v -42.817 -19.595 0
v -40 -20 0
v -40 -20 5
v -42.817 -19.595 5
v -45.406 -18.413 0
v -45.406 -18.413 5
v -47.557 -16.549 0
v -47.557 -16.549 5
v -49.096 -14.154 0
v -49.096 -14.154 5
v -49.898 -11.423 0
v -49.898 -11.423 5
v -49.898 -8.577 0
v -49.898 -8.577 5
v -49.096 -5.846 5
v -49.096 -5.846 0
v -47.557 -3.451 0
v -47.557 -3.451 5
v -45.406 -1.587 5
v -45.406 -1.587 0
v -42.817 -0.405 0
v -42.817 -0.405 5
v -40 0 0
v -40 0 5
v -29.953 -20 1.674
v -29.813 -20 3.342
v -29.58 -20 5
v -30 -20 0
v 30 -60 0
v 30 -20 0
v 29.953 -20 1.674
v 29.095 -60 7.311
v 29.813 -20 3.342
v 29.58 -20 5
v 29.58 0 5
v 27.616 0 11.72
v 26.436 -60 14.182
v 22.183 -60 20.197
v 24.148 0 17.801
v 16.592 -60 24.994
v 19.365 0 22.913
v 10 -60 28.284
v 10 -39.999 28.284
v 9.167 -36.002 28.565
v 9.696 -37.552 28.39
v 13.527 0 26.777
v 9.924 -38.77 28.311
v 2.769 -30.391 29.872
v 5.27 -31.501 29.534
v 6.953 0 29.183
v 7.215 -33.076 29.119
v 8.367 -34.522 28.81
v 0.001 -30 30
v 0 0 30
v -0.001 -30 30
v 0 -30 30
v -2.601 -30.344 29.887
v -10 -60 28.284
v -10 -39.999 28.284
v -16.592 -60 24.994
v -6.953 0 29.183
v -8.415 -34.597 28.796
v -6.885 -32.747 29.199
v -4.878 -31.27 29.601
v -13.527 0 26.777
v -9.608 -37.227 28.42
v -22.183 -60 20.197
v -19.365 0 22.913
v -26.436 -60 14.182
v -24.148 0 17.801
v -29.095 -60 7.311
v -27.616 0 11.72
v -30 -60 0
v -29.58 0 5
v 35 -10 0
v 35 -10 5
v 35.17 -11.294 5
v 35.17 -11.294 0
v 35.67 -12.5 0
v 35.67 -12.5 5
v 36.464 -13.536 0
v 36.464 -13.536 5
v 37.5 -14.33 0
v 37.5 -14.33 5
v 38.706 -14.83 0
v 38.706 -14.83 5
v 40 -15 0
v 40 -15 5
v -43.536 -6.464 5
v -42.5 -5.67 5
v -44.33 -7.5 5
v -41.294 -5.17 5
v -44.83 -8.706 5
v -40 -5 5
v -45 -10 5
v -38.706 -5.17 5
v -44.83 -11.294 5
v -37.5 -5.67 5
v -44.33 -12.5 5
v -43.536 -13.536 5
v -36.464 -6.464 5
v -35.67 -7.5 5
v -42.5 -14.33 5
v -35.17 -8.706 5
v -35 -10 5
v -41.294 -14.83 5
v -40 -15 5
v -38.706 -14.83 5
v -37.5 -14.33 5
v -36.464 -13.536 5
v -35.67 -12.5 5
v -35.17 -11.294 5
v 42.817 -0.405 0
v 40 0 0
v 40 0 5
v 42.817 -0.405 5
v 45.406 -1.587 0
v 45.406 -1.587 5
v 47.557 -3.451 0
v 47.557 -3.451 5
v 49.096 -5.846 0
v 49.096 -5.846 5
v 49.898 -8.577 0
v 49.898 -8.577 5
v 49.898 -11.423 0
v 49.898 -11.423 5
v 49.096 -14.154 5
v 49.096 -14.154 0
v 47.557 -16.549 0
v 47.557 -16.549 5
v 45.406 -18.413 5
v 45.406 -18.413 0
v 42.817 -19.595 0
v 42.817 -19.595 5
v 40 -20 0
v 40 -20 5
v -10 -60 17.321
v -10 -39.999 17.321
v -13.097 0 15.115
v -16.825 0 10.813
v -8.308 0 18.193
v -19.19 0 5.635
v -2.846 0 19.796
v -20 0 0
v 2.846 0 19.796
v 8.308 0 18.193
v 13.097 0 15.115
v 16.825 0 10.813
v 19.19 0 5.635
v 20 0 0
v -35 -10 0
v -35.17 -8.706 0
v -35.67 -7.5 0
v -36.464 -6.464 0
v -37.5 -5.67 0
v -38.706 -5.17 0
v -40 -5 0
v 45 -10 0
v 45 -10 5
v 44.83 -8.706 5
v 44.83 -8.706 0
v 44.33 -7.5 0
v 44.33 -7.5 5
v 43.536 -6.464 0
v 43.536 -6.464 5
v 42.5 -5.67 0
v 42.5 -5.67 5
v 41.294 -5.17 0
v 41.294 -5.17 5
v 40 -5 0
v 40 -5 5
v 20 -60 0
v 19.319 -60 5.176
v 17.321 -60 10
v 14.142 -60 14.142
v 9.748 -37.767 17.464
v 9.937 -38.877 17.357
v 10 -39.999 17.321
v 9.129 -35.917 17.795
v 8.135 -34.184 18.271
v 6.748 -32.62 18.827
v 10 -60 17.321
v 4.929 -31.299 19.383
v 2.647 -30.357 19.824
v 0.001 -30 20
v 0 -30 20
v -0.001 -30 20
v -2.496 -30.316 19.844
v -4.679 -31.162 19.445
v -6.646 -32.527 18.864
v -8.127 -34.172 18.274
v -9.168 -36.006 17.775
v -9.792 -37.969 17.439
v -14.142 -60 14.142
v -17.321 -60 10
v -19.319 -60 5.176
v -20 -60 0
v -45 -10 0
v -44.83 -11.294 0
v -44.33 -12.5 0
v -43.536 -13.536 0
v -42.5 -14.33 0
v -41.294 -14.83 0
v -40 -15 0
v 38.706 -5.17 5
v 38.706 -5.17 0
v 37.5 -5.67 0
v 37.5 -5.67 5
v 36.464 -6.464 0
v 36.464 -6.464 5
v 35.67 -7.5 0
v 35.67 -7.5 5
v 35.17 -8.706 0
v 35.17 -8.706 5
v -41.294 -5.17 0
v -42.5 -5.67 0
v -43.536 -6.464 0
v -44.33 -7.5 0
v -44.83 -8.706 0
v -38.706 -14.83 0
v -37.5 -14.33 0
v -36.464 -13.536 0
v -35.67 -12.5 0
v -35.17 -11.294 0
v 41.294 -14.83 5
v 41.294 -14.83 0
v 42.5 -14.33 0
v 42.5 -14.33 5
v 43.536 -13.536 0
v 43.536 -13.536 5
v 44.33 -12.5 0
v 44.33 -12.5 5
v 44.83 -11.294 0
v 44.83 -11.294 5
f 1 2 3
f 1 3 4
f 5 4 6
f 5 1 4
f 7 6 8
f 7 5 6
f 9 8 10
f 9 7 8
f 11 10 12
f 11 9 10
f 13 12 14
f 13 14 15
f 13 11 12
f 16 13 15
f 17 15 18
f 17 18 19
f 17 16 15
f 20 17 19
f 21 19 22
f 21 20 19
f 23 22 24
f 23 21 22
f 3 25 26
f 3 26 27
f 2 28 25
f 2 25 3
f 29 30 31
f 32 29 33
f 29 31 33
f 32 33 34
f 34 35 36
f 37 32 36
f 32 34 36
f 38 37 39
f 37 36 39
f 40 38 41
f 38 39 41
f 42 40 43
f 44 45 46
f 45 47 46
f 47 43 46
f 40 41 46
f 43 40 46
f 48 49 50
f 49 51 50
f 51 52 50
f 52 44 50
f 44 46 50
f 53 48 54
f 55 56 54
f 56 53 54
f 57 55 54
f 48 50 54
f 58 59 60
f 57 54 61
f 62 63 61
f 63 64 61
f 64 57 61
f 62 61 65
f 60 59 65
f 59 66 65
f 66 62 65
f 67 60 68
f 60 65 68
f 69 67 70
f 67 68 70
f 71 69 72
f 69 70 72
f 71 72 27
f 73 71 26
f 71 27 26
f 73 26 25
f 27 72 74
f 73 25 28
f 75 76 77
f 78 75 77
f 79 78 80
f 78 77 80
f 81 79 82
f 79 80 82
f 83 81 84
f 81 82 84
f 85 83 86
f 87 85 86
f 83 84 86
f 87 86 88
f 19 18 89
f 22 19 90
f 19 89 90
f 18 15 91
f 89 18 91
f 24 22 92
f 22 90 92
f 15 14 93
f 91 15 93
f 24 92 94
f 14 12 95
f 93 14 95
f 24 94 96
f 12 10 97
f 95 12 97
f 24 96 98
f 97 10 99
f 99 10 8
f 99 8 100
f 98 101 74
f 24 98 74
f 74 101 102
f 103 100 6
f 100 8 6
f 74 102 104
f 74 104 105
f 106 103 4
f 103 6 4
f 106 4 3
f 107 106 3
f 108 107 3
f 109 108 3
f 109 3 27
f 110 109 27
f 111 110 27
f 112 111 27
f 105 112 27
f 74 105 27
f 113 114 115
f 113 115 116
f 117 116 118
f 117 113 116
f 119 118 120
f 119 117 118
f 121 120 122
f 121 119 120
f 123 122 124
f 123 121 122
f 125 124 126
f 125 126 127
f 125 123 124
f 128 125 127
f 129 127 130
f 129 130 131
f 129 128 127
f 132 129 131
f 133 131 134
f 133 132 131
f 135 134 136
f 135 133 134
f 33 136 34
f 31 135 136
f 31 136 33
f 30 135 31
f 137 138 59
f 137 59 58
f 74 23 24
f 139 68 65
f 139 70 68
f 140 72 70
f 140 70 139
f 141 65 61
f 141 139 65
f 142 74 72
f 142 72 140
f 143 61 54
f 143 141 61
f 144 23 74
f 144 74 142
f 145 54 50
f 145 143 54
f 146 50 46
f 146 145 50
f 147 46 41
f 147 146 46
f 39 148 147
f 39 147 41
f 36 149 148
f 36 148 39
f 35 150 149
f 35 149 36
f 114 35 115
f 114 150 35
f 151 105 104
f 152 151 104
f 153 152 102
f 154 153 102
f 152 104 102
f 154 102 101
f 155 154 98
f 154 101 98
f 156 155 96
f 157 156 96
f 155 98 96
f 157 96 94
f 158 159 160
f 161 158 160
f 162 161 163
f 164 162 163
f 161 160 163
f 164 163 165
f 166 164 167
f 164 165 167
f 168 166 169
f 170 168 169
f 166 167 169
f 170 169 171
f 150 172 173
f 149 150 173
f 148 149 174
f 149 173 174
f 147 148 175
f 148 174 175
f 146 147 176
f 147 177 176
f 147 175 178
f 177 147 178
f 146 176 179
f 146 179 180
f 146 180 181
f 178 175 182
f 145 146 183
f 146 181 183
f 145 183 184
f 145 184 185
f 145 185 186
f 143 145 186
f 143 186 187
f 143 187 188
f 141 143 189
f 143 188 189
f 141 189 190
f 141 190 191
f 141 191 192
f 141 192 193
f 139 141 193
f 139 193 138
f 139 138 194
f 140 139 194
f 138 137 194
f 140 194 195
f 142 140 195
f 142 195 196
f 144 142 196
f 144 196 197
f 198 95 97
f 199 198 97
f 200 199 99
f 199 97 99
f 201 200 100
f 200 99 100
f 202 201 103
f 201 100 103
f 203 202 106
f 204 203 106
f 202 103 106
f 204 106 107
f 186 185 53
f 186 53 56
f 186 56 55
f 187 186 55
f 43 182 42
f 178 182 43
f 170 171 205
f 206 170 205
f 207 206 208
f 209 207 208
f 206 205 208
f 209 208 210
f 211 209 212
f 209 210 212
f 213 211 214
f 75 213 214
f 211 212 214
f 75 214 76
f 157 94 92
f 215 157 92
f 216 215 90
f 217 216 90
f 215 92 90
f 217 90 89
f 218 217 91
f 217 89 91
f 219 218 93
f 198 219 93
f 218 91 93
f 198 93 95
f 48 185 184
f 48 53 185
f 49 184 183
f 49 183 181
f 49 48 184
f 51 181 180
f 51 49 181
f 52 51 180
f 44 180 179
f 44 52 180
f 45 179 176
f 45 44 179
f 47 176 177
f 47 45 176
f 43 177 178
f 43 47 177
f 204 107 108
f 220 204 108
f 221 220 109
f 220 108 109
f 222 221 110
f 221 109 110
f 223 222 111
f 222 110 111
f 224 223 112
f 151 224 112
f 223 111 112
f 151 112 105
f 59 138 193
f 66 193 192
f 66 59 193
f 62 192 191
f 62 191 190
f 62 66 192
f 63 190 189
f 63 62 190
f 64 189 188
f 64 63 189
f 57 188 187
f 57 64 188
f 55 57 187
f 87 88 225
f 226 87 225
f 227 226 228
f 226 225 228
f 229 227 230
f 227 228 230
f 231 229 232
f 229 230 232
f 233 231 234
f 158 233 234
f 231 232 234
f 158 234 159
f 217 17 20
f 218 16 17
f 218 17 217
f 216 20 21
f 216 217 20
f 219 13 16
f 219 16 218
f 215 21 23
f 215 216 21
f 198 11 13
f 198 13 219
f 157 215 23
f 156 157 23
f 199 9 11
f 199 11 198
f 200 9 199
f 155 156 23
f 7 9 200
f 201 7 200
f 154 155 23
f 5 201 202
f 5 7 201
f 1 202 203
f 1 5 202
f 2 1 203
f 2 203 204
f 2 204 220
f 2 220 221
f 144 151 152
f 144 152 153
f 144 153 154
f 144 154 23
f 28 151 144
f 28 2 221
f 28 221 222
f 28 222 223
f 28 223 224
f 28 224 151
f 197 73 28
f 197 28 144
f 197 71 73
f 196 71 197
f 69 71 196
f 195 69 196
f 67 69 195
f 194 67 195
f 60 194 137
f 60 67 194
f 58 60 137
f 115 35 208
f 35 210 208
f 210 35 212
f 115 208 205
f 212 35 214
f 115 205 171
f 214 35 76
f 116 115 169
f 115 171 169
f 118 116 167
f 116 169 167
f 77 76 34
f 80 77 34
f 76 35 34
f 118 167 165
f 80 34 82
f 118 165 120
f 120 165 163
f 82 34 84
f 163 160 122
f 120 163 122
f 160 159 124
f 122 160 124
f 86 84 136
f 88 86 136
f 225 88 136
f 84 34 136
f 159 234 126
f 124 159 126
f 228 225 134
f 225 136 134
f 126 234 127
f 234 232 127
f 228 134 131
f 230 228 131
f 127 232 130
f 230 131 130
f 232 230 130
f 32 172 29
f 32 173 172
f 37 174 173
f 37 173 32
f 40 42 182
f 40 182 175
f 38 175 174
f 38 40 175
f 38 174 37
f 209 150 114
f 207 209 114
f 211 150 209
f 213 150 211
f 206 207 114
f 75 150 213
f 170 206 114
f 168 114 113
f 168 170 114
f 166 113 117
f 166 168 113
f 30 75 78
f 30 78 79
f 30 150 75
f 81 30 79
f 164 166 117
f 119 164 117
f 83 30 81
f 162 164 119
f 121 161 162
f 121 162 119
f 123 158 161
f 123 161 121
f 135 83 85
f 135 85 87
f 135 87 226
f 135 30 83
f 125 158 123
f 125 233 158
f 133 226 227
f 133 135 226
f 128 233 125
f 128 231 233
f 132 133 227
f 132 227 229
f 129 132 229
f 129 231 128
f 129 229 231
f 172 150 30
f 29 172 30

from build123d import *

# Parameters (mm, degrees)
F1_DEPTH  = 60
F3_DEPTH  = 5
F5_DEPTH  = 5.001
F7_DEPTH  = 5.001
F9_DEPTH  = 60.001
F11_REACH = 66.0565127546
F12_R     = 9.999


# Not quite as in the source:
# - a fillet or chamfer is up to 0.001 mm smaller than in the source, because OpenCascade refuses the exact size


with BuildPart() as f1:
    # F0 (on Front) → F1 (new body)
    with BuildSketch(Plane.XZ):
        with BuildLine():
            Line((-30, 0), (30, 0))
            ThreePointArc((30, 0), (0, 30), (-30, 0))
        make_face()
    extrude(amount=F1_DEPTH)

    # F2 (on face) → F3 (join)
    with BuildSketch(Plane(origin=(0, 0, 0), x_dir=(1, 0, 0), z_dir=(0, 0, -1))):
        with BuildLine():
            ThreePointArc((-40, 20), (-50, 10), (-40, 0))
            Line((-40, 0), (40, 0))
            ThreePointArc((40, 0), (50, 10), (40, 20))
            Line((40, 20), (-40, 20))
        make_face()
    extrude(amount=-F3_DEPTH)

    # F4 (on face) → F5 (cut, through all)
    with BuildSketch(Plane.XY.offset(5)):
        with BuildLine():
            Line((-45, -10), (-40, -10))
            Line((-40, -10), (-40, -5))
            ThreePointArc((-40, -5), (-43.5355339059, -6.4644660941), (-45, -10))
        make_face()
        with BuildLine():
            Line((-40, -5), (-40, -10))
            Line((-40, -10), (-35, -10))
            ThreePointArc((-35, -10), (-36.4644660941, -6.4644660941), (-40, -5))
        make_face()
        with BuildLine():
            Line((-40, -10), (-40, -15))
            ThreePointArc((-40, -15), (-36.4644660941, -13.5355339059), (-35, -10))
            Line((-35, -10), (-40, -10))
        make_face()
        with BuildLine():
            ThreePointArc((-45, -10), (-43.5355339059, -13.5355339059), (-40, -15))
            Line((-40, -15), (-40, -10))
            Line((-40, -10), (-45, -10))
        make_face()
    extrude(amount=-F5_DEPTH, mode=Mode.SUBTRACT)

    # F6 (on face) → F7 (cut, through all)
    with BuildSketch(Plane.XY.offset(5)):
        with BuildLine():
            ThreePointArc((40, -5), (36.4644660941, -6.4644660941), (35, -10))
            Line((35, -10), (40, -10))
            Line((40, -10), (40, -5))
        make_face()
        with BuildLine():
            Line((40, -5), (40, -10))
            Line((40, -10), (45, -10))
            ThreePointArc((45, -10), (43.5355339059, -6.4644660941), (40, -5))
        make_face()
        with BuildLine():
            Line((45, -10), (40, -10))
            Line((40, -10), (40, -15))
            ThreePointArc((40, -15), (43.5355339059, -13.5355339059), (45, -10))
        make_face()
        with BuildLine():
            Line((40, -10), (35, -10))
            ThreePointArc((35, -10), (36.4644660941, -13.5355339059), (40, -15))
            Line((40, -15), (40, -10))
        make_face()
    extrude(amount=-F7_DEPTH, mode=Mode.SUBTRACT)

    # F8 (on face) → F9 (cut, through all)
    with BuildSketch(Plane.XZ.offset(60)):
        with BuildLine():
            Line((-20, 0), (20, 0))
            ThreePointArc((20, 0), (0, 20), (-20, 0))
        make_face()
    extrude(amount=-F9_DEPTH, mode=Mode.SUBTRACT)

    f11_end = f1.faces().sort_by_distance((0, -30, 30))[0]
    # F10 (on Top) → F11 (cut, up to a face of the model that its end follows)
    with BuildSketch(Plane.XY):
        Polygon((-10, -60), (0, -60), (10, -60), (10, -30), (-10, -30), align=None)
    f11_long = extrude(amount=F11_REACH, mode=Mode.PRIVATE)
    add(split(f11_long, bisect_by=f11_end, keep=Keep.BOTTOM, mode=Mode.PRIVATE), mode=Mode.SUBTRACT)

    # F12 (radius 10 in the source; OpenCascade refuses exactly that, so slightly less here)
    f12_edges = [f1.edges().sort_by_distance(p)[0] for p in [
        (-10, -30, 22.80239),
        (10, -30, 22.80239),
    ]]
    fillet(f12_edges, radius=F12_R)


solid = f1.part
